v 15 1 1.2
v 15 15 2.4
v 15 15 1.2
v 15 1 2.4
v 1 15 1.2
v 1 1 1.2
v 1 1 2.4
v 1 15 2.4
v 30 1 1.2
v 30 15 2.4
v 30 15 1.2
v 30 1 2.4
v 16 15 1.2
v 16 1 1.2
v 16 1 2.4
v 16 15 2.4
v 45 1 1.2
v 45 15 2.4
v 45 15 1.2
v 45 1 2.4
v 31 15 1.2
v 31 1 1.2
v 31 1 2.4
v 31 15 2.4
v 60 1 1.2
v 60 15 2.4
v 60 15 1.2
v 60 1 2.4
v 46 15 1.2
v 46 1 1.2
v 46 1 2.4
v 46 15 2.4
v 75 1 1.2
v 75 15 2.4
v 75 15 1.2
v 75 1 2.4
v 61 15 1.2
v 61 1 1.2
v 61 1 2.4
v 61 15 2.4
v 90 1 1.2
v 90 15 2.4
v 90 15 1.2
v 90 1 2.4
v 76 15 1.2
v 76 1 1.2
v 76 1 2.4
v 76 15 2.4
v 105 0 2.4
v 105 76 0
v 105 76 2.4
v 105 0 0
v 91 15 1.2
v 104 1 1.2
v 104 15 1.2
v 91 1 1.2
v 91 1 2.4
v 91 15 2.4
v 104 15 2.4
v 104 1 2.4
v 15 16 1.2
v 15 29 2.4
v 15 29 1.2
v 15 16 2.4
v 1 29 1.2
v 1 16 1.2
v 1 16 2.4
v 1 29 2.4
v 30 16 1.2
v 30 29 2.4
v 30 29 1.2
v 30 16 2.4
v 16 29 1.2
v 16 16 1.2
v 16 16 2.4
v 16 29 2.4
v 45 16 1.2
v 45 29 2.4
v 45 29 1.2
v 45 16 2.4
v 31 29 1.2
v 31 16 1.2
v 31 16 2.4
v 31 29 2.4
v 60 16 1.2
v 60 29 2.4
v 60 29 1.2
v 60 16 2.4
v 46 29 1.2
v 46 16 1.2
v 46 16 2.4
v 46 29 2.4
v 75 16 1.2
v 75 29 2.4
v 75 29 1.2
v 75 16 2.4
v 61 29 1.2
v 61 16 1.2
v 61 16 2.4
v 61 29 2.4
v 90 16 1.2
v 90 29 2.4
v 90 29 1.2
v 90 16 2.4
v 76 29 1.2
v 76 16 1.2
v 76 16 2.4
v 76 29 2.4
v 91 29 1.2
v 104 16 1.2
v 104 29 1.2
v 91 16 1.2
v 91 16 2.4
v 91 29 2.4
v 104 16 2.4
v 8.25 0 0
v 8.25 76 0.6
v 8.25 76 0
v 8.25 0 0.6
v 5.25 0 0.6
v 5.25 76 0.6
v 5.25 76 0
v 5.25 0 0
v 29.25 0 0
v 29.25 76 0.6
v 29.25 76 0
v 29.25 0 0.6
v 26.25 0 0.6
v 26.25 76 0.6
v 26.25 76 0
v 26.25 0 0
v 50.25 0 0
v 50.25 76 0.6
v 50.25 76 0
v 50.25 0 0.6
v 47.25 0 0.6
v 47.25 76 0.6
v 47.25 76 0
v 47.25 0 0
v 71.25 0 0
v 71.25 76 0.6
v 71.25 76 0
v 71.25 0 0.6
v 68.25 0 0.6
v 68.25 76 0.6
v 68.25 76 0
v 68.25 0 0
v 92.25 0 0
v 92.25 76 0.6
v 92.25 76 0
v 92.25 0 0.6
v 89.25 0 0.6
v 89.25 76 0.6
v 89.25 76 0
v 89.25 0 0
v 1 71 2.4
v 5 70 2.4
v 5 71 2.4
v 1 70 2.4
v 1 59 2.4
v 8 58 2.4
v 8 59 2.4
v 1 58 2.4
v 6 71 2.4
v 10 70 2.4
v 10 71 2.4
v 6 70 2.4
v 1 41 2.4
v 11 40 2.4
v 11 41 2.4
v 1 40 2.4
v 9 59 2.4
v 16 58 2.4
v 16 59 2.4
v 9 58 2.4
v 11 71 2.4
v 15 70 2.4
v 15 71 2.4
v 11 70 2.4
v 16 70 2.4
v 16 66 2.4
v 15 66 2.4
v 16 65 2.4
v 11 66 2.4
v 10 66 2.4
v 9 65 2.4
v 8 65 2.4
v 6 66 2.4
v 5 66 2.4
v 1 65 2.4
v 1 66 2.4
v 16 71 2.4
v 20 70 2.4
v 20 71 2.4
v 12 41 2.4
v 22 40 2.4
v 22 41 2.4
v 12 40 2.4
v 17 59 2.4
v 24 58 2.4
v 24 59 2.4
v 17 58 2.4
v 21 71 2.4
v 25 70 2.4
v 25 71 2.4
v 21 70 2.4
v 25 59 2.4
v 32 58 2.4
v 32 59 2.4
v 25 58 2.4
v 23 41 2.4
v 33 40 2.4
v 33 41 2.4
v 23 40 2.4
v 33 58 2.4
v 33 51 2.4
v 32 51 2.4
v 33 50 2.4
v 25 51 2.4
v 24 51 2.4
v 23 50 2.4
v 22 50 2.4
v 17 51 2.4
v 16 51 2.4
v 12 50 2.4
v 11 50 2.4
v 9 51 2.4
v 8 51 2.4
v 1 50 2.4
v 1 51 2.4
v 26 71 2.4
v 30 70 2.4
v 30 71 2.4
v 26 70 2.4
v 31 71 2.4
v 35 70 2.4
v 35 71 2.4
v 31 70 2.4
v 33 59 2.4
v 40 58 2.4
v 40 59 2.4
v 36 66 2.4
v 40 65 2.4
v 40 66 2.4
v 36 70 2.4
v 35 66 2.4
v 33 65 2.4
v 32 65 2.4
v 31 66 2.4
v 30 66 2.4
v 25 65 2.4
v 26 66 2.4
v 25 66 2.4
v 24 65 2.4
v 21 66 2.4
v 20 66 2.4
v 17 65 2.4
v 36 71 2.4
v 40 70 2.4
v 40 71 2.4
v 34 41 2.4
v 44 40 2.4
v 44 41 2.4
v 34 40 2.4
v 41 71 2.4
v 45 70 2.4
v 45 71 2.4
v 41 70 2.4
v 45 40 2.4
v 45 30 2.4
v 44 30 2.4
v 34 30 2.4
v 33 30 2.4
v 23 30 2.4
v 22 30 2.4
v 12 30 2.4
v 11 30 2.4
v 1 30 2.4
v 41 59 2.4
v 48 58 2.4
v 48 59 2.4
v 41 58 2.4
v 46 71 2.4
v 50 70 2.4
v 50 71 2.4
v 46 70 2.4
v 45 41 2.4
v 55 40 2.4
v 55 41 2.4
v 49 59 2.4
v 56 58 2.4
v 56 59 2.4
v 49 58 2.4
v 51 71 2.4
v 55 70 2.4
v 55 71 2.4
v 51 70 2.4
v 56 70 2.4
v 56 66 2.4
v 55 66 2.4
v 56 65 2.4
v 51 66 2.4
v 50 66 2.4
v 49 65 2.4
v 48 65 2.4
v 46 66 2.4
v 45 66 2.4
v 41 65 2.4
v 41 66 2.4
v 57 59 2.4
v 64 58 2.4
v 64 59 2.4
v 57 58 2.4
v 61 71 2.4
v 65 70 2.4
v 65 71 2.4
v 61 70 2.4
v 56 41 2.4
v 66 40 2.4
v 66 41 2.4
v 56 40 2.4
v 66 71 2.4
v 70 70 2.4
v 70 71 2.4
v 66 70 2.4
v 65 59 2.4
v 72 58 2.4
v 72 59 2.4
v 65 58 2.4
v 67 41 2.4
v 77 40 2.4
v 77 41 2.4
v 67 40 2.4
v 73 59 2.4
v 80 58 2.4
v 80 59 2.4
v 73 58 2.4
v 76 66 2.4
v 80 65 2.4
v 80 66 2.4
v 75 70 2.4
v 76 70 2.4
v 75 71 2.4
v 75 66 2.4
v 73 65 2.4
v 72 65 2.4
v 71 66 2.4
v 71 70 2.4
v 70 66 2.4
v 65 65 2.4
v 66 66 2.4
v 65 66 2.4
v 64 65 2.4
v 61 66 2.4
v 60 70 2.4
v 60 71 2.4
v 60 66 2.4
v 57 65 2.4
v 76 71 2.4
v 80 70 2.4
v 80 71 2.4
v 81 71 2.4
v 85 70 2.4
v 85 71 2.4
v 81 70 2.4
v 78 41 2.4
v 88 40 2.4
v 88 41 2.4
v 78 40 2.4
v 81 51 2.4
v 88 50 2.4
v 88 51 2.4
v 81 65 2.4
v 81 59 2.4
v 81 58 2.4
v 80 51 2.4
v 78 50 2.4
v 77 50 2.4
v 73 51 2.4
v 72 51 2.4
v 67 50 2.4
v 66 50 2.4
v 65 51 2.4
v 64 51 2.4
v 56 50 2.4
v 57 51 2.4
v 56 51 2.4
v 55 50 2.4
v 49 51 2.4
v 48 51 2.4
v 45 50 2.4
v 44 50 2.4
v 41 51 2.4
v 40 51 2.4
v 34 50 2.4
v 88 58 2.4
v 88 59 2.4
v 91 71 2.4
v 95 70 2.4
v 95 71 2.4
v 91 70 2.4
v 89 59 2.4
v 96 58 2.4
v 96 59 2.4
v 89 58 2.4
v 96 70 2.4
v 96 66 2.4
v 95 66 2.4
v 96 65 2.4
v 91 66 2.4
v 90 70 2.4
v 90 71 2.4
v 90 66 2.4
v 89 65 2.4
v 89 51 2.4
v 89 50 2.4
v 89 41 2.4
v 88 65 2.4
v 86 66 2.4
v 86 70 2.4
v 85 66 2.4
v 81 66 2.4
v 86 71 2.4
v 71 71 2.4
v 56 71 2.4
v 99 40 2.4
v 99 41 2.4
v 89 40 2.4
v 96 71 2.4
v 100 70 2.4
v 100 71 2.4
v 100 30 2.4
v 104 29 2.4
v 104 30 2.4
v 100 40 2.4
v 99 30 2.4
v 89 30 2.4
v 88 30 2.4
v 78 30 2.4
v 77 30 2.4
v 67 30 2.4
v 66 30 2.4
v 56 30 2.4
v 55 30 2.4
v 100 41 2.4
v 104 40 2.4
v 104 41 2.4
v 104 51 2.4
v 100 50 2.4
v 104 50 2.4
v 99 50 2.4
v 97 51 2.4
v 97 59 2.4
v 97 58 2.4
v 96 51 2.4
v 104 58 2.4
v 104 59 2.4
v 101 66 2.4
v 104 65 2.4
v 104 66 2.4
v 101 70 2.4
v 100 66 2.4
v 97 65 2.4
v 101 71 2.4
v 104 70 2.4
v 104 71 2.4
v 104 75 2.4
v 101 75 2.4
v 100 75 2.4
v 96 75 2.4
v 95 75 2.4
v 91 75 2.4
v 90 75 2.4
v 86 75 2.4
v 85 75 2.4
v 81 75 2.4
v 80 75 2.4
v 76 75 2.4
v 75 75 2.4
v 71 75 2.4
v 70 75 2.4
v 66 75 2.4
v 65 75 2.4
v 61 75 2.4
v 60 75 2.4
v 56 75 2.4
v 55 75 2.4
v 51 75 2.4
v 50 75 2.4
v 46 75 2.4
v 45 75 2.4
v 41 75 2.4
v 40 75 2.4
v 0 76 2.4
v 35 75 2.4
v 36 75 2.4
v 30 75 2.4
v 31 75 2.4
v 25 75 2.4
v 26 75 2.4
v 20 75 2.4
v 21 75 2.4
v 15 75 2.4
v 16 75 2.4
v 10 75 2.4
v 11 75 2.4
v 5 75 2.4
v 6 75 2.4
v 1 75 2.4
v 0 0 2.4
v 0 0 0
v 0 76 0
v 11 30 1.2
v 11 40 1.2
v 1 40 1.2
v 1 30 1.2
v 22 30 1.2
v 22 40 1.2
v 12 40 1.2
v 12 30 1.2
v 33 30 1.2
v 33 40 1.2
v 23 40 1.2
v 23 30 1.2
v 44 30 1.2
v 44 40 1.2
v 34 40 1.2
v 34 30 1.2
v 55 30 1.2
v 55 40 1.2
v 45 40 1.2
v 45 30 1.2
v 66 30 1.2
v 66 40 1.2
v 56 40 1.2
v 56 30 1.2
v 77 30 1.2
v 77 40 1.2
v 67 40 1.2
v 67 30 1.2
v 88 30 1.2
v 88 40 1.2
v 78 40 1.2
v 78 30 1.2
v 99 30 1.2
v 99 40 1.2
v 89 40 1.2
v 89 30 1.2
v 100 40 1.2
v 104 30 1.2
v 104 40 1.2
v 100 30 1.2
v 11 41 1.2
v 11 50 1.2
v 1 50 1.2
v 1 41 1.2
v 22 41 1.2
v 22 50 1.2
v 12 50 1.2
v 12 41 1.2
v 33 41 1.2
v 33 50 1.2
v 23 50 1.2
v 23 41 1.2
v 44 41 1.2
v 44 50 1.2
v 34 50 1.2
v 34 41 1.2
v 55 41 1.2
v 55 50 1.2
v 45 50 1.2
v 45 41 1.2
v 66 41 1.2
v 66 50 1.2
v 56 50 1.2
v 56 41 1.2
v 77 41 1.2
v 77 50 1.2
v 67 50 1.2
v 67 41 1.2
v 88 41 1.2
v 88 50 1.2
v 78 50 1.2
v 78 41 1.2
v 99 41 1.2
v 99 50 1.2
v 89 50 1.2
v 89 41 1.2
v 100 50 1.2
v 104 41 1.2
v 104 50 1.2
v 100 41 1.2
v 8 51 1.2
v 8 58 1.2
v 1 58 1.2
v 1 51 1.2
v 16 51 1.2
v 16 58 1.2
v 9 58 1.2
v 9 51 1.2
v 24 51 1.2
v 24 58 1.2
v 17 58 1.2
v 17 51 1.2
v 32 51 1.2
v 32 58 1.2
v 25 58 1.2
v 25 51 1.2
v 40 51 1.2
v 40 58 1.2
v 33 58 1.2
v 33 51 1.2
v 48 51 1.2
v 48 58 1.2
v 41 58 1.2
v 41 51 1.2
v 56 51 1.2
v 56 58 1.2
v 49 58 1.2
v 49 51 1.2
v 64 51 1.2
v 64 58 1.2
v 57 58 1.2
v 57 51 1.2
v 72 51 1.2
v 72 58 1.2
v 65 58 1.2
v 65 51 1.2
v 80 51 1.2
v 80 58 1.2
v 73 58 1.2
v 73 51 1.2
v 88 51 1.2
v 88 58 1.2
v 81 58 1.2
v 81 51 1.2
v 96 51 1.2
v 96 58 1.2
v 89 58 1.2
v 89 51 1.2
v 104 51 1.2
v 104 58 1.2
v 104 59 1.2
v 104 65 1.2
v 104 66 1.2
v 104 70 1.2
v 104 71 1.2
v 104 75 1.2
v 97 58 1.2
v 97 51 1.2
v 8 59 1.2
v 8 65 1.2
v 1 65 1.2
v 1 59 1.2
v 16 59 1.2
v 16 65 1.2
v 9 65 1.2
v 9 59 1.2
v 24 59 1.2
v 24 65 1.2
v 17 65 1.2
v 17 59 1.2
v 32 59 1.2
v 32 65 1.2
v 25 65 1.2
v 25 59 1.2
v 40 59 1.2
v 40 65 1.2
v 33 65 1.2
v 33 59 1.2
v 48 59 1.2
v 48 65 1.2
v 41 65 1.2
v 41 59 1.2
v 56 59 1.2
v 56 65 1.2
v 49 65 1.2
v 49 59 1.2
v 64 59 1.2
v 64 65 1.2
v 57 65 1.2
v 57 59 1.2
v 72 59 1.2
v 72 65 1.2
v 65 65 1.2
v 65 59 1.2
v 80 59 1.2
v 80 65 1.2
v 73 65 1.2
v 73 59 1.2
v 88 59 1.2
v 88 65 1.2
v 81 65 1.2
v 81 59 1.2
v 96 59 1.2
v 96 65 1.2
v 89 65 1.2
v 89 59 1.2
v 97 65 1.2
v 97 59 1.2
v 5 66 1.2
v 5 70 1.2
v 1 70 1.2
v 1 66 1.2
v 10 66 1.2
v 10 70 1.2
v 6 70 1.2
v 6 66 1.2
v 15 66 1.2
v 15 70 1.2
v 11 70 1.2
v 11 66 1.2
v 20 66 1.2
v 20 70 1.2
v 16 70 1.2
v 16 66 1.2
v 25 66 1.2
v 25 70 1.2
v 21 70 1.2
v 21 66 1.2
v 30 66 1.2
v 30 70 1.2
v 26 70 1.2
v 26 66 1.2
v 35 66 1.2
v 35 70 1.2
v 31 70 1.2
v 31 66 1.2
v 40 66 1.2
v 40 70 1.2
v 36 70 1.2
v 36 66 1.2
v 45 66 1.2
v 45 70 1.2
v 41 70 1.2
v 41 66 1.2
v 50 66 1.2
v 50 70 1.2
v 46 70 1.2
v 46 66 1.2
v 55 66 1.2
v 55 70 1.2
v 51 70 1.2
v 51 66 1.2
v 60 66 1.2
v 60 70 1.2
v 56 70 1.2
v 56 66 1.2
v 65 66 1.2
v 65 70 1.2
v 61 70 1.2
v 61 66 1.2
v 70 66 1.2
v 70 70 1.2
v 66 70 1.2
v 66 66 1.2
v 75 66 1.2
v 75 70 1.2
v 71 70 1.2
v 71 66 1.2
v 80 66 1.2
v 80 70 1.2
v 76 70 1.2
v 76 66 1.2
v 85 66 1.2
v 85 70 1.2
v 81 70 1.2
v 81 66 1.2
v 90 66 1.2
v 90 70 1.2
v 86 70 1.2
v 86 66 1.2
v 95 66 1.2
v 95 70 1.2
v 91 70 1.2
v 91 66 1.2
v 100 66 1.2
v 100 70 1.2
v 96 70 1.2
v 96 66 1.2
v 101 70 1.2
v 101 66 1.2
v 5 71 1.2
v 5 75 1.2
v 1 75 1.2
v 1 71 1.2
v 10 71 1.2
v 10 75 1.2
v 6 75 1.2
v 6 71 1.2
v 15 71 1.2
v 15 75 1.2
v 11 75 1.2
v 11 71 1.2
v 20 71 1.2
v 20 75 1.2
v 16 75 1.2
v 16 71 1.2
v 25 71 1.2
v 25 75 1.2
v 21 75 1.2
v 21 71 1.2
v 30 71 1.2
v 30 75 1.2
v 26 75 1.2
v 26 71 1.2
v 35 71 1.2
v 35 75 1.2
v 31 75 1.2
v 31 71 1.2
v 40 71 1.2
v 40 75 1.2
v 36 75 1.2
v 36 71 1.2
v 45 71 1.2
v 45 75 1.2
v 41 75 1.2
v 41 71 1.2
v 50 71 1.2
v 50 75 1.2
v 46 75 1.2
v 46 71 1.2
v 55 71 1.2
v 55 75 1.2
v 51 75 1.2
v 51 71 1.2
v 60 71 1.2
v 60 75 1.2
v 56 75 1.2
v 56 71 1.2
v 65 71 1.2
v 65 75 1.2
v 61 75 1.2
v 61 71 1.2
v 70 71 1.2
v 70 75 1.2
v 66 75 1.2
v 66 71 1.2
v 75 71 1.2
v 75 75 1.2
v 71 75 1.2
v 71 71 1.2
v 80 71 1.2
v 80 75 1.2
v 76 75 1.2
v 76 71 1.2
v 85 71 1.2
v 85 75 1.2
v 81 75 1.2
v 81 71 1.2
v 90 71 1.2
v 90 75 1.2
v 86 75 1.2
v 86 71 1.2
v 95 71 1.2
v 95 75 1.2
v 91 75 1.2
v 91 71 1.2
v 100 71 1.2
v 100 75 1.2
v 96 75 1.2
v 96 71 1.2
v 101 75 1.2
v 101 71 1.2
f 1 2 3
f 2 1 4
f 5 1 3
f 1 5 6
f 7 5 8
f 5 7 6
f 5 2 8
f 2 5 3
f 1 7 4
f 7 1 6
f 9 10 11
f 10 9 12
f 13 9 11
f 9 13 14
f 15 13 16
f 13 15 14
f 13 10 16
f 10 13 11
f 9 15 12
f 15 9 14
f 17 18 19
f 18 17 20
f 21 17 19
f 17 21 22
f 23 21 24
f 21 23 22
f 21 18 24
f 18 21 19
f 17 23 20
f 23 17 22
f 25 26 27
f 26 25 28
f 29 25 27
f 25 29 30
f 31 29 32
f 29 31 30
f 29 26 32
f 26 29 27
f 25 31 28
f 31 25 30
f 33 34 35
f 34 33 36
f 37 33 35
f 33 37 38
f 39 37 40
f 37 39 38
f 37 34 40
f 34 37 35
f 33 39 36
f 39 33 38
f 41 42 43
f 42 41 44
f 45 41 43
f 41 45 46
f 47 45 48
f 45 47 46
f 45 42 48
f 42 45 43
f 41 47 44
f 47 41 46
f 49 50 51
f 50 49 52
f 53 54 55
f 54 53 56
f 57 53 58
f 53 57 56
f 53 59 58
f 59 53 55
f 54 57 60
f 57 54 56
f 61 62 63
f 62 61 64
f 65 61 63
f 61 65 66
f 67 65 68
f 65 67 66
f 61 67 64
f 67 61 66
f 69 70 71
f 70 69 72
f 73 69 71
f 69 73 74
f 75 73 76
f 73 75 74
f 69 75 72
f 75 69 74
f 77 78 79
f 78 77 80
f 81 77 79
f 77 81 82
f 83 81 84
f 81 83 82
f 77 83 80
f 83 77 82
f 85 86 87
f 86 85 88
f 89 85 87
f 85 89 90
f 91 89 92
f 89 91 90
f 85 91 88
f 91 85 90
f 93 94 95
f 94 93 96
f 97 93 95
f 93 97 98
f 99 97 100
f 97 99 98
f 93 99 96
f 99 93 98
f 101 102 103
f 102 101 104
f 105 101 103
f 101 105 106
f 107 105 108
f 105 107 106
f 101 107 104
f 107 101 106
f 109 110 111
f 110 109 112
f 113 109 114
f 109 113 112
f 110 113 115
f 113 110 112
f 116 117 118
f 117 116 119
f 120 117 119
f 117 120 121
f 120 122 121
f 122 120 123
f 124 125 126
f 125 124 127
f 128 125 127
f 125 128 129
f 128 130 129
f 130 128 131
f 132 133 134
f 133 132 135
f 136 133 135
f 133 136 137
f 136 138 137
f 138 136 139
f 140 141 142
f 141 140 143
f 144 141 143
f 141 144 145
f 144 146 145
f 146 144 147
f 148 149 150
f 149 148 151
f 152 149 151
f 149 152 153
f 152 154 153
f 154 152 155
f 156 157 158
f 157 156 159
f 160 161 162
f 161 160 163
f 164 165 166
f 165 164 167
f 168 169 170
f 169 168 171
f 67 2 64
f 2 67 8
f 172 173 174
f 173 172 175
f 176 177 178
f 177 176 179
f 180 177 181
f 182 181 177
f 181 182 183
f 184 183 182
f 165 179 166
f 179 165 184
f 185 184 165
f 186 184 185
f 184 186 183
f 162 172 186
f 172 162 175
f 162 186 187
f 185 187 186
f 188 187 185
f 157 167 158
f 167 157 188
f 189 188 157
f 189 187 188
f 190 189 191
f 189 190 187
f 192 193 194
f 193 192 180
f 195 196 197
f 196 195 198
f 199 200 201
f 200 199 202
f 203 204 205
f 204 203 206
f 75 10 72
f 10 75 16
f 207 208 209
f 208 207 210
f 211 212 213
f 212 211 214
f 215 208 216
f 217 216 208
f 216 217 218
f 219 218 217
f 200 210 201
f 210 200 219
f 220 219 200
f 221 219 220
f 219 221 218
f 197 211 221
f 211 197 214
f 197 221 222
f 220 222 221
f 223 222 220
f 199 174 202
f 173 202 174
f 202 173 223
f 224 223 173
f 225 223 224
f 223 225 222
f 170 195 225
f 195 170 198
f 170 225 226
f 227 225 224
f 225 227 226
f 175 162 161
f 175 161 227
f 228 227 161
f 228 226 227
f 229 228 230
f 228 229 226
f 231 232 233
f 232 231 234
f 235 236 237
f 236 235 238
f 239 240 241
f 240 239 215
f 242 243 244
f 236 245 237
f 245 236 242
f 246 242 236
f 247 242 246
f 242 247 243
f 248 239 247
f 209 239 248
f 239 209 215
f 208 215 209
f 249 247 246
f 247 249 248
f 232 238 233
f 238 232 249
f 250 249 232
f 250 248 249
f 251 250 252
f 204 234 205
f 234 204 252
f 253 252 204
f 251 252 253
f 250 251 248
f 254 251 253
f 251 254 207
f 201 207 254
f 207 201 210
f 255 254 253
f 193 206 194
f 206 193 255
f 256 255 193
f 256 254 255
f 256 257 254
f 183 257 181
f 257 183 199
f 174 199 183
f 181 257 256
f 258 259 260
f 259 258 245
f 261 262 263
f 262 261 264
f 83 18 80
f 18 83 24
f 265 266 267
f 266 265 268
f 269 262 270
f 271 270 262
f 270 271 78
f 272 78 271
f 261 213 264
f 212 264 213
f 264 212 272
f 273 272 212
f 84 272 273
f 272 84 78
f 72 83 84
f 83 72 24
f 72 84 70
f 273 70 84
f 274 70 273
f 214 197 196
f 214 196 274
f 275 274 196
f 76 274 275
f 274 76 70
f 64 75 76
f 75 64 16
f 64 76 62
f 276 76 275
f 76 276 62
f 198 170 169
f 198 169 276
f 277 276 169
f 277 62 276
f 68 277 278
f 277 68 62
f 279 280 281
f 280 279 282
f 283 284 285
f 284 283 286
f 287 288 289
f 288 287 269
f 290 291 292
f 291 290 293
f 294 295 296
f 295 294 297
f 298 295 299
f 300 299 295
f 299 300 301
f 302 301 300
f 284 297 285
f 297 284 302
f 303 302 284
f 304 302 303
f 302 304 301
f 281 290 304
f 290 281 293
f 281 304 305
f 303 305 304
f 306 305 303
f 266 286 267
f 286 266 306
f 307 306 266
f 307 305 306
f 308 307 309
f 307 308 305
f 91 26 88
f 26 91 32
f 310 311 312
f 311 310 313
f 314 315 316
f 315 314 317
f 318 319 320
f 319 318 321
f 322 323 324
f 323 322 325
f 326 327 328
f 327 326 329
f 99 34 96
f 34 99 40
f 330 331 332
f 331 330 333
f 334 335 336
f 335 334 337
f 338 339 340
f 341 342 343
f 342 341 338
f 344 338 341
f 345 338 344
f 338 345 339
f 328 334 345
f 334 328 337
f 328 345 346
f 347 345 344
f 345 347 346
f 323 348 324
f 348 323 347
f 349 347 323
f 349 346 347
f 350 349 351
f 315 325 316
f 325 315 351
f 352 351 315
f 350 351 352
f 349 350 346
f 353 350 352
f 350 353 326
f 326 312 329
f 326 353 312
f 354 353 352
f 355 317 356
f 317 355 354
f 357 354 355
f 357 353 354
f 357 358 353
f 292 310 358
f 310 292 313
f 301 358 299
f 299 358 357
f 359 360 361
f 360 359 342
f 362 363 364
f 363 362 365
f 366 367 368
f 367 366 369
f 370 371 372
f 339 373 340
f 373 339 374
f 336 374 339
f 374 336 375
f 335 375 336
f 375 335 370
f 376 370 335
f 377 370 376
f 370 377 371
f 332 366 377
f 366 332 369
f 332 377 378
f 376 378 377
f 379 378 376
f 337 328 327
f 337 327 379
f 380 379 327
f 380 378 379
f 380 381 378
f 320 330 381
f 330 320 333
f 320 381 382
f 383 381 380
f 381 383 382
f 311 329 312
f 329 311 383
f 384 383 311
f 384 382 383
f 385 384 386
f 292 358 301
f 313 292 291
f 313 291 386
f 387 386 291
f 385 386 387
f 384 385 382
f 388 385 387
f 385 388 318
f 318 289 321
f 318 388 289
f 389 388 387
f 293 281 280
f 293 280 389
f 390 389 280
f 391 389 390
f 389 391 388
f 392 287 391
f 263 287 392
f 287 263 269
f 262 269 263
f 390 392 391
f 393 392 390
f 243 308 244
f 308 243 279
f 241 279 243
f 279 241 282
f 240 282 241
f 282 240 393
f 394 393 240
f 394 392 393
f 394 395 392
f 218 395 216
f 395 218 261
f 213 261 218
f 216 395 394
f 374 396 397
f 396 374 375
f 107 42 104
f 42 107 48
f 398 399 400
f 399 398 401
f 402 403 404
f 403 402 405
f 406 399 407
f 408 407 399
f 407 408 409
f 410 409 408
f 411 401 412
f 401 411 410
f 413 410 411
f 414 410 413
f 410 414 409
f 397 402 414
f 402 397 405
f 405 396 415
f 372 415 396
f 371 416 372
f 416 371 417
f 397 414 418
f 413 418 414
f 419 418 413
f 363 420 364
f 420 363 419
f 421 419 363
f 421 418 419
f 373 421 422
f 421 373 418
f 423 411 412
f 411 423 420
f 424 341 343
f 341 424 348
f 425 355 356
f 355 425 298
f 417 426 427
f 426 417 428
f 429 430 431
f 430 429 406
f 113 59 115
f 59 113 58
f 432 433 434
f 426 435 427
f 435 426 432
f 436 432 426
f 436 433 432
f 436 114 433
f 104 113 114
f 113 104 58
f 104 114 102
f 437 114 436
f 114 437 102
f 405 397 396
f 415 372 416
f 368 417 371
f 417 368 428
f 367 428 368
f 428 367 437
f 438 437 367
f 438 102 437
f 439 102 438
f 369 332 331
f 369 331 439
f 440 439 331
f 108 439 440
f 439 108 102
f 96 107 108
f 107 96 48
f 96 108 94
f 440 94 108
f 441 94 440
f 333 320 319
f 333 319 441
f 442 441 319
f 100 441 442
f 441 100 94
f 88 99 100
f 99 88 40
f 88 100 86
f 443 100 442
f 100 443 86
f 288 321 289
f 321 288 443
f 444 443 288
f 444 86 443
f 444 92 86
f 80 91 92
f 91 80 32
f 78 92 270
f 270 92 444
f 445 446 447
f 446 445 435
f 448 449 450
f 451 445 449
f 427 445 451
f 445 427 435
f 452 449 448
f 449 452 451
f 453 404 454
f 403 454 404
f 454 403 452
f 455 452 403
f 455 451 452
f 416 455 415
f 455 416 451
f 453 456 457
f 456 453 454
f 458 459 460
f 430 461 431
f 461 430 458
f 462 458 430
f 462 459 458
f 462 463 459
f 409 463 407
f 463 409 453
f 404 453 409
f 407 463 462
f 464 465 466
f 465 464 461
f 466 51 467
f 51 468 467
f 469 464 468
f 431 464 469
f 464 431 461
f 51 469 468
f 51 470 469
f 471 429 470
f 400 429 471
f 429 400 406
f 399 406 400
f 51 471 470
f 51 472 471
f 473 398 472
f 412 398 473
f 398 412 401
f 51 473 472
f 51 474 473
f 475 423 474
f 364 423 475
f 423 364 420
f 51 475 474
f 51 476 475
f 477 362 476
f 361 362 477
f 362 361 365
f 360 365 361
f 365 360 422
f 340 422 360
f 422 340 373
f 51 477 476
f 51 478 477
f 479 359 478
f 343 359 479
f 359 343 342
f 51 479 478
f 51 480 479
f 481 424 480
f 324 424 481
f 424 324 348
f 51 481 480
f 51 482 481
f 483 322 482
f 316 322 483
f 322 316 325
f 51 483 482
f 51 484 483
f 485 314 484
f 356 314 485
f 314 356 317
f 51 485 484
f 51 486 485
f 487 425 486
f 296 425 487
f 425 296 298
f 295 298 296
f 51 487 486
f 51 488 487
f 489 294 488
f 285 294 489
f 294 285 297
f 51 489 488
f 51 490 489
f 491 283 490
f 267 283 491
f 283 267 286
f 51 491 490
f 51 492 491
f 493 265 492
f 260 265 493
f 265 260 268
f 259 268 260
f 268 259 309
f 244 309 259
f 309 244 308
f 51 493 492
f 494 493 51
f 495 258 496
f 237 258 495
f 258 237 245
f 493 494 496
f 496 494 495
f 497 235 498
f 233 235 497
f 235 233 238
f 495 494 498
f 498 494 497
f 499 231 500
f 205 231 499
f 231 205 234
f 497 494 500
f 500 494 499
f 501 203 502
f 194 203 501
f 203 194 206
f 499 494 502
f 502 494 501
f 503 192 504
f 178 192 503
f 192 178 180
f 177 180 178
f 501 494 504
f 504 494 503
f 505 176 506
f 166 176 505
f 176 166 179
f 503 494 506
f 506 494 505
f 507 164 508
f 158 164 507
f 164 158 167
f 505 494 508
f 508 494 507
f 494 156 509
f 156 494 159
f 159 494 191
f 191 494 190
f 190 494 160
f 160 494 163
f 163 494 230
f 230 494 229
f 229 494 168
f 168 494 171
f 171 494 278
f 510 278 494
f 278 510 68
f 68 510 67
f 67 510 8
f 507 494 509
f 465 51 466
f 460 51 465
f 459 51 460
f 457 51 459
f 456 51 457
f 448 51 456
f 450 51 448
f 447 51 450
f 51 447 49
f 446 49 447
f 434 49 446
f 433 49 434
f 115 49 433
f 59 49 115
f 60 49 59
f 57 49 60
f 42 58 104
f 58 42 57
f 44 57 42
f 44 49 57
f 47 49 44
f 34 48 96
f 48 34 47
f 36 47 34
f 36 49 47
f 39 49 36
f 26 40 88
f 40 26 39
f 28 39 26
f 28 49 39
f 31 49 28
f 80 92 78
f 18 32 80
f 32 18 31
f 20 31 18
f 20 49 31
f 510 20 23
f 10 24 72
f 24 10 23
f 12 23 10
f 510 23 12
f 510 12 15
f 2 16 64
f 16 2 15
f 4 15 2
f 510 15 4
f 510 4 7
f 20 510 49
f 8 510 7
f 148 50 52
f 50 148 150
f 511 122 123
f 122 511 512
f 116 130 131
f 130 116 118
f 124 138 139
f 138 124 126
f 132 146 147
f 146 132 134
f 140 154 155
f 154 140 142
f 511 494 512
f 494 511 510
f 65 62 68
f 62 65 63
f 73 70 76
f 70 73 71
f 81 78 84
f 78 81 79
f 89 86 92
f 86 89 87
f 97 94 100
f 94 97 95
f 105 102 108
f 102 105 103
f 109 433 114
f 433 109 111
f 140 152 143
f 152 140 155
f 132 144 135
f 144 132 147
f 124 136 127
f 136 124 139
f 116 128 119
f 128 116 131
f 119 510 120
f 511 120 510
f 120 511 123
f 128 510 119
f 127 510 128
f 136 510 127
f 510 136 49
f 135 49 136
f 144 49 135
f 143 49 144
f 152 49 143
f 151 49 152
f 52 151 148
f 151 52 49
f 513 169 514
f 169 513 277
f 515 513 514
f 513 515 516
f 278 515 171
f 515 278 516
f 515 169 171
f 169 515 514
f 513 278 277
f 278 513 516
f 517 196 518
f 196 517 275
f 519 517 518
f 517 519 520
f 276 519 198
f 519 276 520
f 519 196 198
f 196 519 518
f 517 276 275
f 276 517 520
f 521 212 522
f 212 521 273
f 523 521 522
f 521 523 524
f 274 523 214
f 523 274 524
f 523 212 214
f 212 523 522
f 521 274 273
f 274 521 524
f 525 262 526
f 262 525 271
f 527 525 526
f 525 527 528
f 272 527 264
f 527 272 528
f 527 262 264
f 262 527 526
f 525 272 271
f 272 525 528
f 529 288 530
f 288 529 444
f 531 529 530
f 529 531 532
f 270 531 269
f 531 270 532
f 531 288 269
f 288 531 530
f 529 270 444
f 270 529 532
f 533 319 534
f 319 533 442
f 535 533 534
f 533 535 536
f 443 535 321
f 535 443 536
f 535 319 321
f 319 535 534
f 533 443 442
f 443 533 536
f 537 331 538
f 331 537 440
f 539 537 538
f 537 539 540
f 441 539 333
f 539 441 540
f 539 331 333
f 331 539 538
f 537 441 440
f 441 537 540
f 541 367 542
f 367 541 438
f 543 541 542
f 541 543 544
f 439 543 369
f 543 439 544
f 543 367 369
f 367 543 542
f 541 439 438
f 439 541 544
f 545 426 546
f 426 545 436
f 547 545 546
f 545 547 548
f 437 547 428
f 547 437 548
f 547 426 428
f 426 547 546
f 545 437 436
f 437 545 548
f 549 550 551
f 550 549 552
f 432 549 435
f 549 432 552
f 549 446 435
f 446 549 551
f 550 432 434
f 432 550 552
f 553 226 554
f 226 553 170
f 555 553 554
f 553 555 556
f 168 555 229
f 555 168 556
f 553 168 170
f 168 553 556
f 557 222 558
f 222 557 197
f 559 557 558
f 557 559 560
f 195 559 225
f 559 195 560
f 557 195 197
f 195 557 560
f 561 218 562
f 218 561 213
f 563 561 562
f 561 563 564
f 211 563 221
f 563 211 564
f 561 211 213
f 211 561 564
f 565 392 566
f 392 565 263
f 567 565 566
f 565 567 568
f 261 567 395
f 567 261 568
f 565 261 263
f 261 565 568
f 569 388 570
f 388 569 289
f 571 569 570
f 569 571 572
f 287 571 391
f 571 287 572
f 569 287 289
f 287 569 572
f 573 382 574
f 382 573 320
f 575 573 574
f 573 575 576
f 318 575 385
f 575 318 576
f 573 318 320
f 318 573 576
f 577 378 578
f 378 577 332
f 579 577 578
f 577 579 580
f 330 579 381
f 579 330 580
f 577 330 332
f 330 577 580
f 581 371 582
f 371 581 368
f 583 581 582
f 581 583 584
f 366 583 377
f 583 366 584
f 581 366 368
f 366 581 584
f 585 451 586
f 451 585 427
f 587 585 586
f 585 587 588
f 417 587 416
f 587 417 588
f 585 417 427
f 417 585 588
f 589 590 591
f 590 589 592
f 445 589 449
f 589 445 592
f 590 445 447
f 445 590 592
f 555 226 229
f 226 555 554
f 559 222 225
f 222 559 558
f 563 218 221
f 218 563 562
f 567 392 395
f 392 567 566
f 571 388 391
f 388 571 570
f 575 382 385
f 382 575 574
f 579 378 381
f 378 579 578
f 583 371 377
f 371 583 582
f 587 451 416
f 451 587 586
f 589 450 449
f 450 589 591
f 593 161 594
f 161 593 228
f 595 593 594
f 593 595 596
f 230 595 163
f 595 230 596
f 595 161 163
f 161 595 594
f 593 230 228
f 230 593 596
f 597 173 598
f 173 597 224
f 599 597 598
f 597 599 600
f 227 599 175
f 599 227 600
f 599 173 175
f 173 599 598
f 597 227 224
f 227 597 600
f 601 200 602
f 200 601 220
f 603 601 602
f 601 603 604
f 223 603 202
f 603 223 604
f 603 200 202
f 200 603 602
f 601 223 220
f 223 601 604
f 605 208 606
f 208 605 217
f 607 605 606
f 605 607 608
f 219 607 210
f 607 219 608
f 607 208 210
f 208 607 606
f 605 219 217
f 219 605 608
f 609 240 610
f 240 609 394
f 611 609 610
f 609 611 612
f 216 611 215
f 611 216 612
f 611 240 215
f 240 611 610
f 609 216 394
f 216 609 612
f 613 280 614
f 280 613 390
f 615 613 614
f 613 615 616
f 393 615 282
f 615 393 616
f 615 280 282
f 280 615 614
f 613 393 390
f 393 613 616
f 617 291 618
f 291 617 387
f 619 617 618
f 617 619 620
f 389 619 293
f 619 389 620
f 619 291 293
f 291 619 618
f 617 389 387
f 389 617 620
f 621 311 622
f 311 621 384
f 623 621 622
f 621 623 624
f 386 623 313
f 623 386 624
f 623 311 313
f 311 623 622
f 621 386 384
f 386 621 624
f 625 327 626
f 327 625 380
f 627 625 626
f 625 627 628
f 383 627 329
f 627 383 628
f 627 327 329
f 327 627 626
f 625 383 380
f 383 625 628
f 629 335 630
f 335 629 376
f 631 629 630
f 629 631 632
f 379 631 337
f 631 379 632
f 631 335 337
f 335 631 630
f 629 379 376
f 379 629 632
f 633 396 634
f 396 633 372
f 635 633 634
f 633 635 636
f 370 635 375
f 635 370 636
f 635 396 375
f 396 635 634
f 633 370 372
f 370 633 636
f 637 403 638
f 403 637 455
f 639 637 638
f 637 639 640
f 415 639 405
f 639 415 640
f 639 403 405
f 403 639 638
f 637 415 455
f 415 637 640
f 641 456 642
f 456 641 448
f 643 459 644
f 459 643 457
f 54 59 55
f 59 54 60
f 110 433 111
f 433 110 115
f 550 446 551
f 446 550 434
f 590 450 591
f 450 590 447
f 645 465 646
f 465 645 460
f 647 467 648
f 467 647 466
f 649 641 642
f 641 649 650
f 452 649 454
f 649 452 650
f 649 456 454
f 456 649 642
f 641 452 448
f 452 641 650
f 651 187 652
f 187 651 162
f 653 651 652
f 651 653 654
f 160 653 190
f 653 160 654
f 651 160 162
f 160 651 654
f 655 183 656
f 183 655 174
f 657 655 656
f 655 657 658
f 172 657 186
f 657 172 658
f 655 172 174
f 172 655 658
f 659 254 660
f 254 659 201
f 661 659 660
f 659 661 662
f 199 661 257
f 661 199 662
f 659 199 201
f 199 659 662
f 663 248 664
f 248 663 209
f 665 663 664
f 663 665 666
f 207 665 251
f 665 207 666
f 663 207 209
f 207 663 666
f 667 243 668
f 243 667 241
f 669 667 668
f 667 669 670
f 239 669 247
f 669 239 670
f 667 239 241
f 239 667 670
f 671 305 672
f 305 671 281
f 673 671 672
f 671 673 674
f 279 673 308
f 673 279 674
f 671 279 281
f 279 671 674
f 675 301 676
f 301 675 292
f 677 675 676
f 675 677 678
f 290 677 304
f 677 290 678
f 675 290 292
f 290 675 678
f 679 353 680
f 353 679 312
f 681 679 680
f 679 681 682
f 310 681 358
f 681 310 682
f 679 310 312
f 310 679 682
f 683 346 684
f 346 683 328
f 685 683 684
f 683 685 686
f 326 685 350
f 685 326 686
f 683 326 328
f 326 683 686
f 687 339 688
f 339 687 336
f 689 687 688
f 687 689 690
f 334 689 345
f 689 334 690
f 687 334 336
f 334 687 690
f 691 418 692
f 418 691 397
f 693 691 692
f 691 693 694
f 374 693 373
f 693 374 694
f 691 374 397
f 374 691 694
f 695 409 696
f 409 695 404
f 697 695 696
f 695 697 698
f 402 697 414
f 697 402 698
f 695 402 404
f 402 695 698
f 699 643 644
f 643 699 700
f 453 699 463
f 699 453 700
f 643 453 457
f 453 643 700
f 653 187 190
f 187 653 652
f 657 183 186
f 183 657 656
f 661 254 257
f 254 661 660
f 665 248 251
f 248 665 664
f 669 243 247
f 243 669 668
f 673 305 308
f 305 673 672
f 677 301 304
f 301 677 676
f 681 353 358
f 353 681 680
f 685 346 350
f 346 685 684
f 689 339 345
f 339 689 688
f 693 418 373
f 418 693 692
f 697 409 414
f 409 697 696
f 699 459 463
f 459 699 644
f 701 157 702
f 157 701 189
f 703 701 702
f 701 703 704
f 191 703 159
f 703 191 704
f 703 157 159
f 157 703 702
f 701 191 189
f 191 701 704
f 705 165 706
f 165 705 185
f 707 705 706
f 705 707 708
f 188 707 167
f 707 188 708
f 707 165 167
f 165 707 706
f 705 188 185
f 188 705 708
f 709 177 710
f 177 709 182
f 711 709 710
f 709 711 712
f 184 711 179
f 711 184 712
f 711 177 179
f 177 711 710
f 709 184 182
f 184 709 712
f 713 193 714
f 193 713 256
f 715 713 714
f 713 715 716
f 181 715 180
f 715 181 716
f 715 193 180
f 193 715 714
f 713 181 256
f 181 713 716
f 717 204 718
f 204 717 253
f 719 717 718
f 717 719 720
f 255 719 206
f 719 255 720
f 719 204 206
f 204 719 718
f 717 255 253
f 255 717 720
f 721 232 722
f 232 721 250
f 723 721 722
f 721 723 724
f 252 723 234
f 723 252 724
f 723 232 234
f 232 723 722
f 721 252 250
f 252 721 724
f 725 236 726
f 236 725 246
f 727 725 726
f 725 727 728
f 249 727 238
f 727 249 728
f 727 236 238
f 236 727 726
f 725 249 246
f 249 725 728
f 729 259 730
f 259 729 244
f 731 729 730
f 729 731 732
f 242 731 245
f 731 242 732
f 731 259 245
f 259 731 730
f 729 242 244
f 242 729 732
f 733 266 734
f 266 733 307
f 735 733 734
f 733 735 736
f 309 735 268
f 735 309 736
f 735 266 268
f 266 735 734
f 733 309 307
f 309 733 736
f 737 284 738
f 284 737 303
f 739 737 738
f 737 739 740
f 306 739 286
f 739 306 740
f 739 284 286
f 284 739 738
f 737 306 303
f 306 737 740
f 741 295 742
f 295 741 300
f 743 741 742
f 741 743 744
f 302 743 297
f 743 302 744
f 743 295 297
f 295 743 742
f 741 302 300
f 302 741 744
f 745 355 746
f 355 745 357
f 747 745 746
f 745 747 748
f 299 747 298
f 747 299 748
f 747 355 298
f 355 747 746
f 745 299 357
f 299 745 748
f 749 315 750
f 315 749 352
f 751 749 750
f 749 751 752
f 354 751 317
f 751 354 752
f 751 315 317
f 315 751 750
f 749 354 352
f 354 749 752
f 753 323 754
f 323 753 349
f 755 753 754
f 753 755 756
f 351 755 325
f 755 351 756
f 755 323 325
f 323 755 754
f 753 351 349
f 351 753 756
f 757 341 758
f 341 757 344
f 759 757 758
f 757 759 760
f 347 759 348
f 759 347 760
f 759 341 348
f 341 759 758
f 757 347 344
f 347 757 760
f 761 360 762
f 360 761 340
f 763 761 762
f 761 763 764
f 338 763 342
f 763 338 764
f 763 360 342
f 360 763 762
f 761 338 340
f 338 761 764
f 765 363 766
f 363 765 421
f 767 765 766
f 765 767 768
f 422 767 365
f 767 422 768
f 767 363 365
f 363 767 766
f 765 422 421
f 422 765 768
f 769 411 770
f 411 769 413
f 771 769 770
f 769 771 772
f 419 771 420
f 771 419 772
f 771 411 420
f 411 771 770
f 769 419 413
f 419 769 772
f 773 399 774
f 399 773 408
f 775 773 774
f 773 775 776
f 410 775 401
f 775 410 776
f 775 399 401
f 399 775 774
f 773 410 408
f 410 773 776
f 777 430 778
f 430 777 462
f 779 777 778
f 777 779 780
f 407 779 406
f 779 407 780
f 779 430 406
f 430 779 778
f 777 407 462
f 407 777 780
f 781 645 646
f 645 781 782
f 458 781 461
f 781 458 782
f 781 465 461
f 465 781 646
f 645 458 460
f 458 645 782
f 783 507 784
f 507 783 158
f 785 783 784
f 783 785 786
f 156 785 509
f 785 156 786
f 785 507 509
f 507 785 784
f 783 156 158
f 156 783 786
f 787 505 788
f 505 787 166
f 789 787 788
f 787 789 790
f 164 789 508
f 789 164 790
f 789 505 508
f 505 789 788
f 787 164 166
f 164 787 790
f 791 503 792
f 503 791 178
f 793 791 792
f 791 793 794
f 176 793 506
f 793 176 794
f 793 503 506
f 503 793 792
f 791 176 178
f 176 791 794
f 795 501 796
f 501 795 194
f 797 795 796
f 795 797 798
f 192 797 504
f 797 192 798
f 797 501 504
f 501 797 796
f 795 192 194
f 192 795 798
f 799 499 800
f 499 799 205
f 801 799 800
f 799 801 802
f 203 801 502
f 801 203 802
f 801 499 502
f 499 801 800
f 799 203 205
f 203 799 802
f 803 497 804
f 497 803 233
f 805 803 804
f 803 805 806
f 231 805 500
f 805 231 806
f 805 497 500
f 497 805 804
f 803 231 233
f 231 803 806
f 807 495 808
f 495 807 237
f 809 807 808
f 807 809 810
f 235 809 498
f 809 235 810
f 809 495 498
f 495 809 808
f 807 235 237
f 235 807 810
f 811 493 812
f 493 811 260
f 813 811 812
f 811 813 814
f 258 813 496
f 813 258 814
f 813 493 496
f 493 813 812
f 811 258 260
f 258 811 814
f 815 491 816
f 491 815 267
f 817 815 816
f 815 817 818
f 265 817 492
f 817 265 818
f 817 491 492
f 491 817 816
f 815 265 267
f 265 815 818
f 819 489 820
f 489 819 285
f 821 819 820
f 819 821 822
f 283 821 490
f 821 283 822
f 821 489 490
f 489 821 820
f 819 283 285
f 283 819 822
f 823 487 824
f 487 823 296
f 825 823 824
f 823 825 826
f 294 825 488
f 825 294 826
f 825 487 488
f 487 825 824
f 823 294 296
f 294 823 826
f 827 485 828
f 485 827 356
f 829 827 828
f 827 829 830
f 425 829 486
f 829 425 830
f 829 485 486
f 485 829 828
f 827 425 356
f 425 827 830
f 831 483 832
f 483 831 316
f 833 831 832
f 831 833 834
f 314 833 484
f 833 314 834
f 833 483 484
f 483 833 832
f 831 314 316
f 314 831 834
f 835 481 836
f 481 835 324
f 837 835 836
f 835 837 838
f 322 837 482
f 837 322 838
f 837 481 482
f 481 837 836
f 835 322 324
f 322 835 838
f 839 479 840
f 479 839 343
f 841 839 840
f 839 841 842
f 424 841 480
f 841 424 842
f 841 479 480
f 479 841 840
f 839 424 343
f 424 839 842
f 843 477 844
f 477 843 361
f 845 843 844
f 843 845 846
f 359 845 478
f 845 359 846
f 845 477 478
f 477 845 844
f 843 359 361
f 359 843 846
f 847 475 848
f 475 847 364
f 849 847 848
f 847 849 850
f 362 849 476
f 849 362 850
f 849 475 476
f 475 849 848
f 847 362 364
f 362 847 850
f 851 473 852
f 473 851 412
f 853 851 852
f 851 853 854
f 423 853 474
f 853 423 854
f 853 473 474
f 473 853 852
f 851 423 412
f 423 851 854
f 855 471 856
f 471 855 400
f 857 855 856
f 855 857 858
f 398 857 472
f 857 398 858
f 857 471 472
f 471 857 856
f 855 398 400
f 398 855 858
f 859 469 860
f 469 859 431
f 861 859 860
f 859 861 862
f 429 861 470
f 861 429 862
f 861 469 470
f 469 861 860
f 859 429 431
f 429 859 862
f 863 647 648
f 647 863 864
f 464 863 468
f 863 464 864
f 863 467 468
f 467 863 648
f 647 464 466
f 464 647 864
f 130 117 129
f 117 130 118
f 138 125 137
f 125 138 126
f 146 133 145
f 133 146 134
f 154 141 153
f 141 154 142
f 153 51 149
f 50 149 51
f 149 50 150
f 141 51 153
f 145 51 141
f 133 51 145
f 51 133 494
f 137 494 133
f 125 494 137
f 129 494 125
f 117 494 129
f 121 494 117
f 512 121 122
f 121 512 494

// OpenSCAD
// base thickness
b=1.2;
// wall height
d=1.2;
// separator width
s=1;

module tray(tw,th,w,h){
c=floor(tw/w);
r=floor(th/h);
difference(){
cube([tw,th,b+d]);

for(i=[0:r-1])
for(j=[0:c-1])
translate([j*(w+s)+s,i*(h+s)+s,b])
cube([w,h,d*2]);

for(i = [0:4])
translate([tw/5 * i + tw/20,-10,-0.6])
cube([3,200,1.2]);
}
}

//tray(169,49,23,23);

tray(105,29,14,14);
translate([0,29,0])
tray(105,21,10,10);
translate([0,21+29,0])
tray(105,15,7,7);
translate([0,15+21+29,0])
tray(105,11,4,4);
translate([105-s,0,0])
cube([s,11+15+21+29,b+d]);
